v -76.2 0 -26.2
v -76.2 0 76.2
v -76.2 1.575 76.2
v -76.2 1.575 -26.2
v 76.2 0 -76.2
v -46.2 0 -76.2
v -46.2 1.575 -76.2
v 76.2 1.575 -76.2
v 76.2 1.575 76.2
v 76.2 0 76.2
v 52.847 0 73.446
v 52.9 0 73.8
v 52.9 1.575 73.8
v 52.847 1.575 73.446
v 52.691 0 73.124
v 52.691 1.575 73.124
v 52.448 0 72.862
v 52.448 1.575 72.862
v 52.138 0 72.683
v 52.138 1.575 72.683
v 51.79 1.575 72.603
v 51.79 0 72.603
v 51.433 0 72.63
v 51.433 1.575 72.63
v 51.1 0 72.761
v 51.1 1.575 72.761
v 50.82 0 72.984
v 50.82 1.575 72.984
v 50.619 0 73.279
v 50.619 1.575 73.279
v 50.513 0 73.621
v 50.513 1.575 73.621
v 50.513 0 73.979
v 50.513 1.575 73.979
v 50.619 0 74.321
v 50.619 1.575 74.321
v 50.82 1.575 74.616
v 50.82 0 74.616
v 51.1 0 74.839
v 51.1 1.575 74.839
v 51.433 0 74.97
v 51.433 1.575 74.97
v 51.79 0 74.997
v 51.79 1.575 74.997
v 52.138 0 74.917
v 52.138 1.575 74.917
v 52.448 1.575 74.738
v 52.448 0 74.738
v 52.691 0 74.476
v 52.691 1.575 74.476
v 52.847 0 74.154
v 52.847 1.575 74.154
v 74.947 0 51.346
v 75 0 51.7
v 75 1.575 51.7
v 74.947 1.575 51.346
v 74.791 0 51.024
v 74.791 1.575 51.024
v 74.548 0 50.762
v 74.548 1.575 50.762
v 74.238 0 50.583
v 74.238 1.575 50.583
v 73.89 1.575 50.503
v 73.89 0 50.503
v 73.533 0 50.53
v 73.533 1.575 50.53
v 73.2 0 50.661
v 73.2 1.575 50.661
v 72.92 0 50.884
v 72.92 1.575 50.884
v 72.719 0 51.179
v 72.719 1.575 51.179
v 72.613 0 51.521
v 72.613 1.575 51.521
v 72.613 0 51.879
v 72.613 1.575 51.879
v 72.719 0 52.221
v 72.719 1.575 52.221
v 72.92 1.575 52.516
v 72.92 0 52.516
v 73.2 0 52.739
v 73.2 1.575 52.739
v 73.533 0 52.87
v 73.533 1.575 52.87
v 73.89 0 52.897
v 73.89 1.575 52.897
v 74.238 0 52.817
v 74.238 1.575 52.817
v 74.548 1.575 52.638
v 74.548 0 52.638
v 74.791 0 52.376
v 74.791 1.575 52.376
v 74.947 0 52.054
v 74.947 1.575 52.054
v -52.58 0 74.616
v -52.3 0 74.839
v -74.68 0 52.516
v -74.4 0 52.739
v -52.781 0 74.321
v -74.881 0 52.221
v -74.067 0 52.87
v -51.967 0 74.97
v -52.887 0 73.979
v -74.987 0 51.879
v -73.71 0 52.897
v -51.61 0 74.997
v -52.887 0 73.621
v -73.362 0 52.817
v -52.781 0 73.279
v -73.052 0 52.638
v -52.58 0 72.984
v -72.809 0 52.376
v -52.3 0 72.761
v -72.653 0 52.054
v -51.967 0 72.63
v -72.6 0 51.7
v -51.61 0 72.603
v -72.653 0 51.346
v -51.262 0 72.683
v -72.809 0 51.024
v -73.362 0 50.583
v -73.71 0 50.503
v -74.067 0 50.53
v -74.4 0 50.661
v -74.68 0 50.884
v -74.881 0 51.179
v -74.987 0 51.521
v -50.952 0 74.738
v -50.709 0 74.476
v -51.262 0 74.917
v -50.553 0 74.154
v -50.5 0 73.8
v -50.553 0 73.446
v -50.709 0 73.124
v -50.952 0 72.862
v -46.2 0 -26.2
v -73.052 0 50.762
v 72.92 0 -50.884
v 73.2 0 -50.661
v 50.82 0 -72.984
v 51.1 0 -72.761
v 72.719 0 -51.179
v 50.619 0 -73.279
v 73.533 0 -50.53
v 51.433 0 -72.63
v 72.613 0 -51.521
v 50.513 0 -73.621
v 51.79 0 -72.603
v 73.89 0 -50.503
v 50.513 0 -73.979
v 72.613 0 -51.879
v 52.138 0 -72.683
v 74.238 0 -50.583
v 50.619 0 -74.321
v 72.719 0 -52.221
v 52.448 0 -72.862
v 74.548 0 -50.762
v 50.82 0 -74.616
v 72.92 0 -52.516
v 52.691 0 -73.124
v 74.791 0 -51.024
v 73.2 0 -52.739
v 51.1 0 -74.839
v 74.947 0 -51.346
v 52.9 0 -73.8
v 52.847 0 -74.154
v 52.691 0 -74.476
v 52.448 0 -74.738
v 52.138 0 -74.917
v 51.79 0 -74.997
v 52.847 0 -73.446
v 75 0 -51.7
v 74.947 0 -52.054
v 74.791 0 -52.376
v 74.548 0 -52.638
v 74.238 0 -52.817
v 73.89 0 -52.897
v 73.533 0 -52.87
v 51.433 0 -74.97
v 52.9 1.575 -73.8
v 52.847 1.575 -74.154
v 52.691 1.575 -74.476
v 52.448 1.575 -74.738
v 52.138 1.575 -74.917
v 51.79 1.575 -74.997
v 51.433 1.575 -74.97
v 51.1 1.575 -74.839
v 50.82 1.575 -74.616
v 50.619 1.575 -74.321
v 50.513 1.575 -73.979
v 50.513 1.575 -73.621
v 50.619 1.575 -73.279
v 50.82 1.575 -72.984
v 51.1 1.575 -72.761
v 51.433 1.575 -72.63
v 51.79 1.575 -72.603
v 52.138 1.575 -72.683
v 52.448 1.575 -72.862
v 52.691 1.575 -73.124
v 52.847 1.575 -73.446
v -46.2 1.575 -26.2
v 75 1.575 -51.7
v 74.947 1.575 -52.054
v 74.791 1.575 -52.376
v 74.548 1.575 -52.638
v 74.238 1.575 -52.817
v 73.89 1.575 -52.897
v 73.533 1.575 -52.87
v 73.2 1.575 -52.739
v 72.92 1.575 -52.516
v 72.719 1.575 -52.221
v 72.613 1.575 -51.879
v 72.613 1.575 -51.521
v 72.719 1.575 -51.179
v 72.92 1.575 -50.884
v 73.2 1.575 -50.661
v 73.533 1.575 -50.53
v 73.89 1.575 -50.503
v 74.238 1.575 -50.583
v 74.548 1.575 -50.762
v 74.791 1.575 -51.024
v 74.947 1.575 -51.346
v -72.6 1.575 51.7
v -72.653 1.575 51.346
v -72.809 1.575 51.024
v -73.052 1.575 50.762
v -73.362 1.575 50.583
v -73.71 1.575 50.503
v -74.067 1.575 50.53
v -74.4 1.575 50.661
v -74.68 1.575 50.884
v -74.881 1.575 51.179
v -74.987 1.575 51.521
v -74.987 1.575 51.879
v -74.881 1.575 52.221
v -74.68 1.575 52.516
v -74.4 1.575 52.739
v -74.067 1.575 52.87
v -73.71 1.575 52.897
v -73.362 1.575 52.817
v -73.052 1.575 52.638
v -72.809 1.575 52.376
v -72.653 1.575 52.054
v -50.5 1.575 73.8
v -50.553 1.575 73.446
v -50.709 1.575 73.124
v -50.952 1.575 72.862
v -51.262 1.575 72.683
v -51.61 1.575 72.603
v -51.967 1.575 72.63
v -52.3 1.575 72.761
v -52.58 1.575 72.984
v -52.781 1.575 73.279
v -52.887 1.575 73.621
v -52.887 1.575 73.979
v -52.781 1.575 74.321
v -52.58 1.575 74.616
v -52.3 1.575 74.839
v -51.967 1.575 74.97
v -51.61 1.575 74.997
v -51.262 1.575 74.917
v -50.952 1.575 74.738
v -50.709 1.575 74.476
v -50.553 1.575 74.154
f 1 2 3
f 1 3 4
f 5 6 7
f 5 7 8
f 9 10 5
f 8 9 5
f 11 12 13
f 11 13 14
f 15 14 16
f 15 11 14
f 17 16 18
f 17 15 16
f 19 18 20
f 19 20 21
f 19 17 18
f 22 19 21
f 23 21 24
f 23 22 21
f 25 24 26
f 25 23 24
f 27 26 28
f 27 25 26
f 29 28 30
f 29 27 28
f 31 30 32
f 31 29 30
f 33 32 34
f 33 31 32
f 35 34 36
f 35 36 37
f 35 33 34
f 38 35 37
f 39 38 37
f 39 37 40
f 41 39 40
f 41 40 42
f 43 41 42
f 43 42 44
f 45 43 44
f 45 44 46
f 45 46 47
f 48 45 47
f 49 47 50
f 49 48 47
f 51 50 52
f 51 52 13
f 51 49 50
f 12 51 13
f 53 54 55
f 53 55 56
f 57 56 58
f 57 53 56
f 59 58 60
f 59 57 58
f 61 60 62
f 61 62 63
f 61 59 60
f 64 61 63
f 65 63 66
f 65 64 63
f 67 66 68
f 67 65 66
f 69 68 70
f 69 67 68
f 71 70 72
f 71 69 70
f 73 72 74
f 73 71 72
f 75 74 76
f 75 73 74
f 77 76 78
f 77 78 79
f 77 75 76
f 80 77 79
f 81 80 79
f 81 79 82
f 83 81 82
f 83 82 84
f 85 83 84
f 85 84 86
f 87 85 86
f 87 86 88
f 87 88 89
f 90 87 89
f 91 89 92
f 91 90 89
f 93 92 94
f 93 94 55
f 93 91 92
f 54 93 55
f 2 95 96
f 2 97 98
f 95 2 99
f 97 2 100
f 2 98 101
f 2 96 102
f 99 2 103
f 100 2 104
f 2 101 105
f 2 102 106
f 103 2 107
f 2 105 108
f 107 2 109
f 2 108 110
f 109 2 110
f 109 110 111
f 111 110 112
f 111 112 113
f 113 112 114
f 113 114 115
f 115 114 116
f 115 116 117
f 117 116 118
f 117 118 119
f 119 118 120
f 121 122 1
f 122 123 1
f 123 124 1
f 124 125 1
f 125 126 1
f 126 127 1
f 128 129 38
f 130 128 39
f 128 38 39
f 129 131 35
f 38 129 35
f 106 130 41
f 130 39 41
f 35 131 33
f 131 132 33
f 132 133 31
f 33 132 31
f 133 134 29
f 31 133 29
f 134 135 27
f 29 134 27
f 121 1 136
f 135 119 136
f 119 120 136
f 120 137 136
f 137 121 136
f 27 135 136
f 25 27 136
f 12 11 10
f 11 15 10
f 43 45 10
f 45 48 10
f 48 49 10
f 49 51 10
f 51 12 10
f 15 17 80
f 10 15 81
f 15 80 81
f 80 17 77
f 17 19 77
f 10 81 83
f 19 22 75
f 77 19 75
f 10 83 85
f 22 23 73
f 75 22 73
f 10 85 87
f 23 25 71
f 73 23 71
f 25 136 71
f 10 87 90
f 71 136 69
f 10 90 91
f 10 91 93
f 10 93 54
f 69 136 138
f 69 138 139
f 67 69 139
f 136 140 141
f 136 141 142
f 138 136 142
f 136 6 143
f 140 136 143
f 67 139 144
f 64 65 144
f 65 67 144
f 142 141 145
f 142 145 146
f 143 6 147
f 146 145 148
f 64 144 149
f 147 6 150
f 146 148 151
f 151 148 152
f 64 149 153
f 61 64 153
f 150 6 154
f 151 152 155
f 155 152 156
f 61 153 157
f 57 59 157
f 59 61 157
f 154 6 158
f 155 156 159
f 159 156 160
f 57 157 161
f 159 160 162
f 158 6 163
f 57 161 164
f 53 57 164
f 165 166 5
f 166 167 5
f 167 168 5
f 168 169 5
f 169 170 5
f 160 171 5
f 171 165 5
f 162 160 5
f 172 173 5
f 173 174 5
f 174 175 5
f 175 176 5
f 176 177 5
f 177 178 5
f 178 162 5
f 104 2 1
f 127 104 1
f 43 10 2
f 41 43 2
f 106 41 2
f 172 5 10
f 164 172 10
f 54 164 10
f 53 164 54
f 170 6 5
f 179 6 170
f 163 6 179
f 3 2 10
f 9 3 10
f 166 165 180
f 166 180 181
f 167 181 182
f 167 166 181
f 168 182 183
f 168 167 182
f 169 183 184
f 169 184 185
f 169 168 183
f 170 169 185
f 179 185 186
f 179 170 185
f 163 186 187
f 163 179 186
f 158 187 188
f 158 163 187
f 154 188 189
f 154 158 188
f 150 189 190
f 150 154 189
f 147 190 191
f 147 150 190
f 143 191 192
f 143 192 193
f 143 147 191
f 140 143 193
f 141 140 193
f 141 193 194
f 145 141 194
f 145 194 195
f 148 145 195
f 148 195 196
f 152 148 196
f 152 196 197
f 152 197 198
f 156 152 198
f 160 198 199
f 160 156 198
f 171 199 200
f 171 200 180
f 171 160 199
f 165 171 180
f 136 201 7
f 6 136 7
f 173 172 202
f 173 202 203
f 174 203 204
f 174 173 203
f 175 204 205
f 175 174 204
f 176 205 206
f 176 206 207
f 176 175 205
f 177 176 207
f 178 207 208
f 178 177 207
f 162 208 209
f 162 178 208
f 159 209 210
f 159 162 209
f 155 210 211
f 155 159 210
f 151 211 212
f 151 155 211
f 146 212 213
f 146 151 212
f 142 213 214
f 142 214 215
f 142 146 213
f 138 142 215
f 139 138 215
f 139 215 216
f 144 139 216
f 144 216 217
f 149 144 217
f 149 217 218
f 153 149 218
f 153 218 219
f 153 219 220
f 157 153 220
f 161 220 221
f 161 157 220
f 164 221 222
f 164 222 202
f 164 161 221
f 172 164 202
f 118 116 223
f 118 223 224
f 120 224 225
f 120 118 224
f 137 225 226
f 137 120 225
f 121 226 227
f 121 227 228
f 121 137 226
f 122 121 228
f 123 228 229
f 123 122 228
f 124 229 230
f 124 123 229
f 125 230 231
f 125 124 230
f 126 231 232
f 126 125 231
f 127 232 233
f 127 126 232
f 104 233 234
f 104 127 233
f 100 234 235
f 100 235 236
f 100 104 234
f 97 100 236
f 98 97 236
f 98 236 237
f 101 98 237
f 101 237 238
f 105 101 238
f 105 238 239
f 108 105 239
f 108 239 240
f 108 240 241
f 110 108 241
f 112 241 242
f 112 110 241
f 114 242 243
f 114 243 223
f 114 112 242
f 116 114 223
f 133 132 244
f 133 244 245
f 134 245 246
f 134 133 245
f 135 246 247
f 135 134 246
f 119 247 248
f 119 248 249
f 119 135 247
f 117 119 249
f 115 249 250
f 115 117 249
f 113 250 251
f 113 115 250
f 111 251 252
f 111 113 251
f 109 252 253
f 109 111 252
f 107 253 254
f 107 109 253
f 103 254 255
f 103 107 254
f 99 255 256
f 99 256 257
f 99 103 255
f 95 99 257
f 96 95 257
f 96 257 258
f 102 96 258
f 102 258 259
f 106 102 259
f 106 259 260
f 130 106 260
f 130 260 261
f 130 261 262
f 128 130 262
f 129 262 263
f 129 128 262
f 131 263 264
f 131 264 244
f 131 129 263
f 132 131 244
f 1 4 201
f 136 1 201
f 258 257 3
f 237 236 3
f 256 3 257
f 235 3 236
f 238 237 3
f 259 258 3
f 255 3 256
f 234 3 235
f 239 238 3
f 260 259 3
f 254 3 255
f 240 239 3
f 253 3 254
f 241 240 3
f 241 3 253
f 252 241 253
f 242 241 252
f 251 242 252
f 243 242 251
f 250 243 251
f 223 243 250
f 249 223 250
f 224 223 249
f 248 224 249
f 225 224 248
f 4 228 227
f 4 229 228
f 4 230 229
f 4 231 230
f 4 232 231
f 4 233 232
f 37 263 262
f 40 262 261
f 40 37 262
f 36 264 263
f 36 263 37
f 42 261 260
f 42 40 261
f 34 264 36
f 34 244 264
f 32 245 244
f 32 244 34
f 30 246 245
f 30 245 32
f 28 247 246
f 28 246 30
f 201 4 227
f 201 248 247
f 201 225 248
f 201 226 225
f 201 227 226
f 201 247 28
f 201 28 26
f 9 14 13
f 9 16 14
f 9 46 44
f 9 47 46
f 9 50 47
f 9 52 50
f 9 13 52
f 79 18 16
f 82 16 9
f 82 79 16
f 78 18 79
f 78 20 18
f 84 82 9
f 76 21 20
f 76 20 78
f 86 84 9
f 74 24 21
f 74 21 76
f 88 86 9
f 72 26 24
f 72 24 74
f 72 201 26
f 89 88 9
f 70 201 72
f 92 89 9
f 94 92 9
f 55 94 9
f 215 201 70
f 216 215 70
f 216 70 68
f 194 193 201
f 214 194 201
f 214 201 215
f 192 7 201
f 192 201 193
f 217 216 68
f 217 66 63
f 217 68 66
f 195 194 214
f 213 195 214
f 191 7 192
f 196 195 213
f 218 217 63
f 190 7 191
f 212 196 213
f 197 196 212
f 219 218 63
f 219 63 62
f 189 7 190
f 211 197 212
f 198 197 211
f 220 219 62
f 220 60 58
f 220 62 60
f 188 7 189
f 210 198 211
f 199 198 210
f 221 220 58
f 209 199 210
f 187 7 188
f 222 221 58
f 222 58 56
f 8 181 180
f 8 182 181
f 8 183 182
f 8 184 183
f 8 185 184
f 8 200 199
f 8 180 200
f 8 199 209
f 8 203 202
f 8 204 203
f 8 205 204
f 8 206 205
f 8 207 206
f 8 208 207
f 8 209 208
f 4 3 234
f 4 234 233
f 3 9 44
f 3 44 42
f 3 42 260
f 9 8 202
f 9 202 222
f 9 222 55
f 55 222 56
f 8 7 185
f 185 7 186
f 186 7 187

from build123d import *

# Parameters (mm, degrees)
SKETCH1_W           = 152.4
SKETCH1_H           = 152.4
SKETCH1_R           = 1.2
BOSS_EXTRUDE1_DEPTH = 1.5748
SKETCH2_W           = 30
SKETCH2_H           = 50
CUT_EXTRUDE1_DEPTH  = 2.5748


with BuildPart() as part:
    # Sketch1 → Boss-Extrude1 (new body)
    with BuildSketch(Plane(origin=(0, 0, 0), x_dir=(1, 0, 0), z_dir=(0, 1, 0))):
        Rectangle(SKETCH1_W, SKETCH1_H)
        with Locations((-51.7, 73.8)):
            Circle(SKETCH1_R, mode=Mode.SUBTRACT)
        with Locations((51.7, 73.8)):
            Circle(SKETCH1_R, mode=Mode.SUBTRACT)
        with Locations((73.8, 51.7)):
            Circle(SKETCH1_R, mode=Mode.SUBTRACT)
        with Locations((73.8, -51.7)):
            Circle(SKETCH1_R, mode=Mode.SUBTRACT)
        with Locations((-73.8, -51.7)):
            Circle(SKETCH1_R, mode=Mode.SUBTRACT)
        with Locations((-73.8, 51.7)):
            Circle(SKETCH1_R, mode=Mode.SUBTRACT)
        with Locations((-51.7, -73.8)):
            Circle(SKETCH1_R, mode=Mode.SUBTRACT)
        with Locations((51.7, -73.8)):
            Circle(SKETCH1_R, mode=Mode.SUBTRACT)
    extrude(amount=BOSS_EXTRUDE1_DEPTH)

    # Sketch2 → Cut-Extrude1 (cut, through all)
    with BuildSketch(Plane(origin=(0, 1.5748, 0), x_dir=(1, 0, 0), z_dir=(0, 1, 0))):
        with Locations((-61.2, 51.2)):
            Rectangle(SKETCH2_W, SKETCH2_H)
    extrude(amount=-CUT_EXTRUDE1_DEPTH, mode=Mode.SUBTRACT)


solid = part.part
